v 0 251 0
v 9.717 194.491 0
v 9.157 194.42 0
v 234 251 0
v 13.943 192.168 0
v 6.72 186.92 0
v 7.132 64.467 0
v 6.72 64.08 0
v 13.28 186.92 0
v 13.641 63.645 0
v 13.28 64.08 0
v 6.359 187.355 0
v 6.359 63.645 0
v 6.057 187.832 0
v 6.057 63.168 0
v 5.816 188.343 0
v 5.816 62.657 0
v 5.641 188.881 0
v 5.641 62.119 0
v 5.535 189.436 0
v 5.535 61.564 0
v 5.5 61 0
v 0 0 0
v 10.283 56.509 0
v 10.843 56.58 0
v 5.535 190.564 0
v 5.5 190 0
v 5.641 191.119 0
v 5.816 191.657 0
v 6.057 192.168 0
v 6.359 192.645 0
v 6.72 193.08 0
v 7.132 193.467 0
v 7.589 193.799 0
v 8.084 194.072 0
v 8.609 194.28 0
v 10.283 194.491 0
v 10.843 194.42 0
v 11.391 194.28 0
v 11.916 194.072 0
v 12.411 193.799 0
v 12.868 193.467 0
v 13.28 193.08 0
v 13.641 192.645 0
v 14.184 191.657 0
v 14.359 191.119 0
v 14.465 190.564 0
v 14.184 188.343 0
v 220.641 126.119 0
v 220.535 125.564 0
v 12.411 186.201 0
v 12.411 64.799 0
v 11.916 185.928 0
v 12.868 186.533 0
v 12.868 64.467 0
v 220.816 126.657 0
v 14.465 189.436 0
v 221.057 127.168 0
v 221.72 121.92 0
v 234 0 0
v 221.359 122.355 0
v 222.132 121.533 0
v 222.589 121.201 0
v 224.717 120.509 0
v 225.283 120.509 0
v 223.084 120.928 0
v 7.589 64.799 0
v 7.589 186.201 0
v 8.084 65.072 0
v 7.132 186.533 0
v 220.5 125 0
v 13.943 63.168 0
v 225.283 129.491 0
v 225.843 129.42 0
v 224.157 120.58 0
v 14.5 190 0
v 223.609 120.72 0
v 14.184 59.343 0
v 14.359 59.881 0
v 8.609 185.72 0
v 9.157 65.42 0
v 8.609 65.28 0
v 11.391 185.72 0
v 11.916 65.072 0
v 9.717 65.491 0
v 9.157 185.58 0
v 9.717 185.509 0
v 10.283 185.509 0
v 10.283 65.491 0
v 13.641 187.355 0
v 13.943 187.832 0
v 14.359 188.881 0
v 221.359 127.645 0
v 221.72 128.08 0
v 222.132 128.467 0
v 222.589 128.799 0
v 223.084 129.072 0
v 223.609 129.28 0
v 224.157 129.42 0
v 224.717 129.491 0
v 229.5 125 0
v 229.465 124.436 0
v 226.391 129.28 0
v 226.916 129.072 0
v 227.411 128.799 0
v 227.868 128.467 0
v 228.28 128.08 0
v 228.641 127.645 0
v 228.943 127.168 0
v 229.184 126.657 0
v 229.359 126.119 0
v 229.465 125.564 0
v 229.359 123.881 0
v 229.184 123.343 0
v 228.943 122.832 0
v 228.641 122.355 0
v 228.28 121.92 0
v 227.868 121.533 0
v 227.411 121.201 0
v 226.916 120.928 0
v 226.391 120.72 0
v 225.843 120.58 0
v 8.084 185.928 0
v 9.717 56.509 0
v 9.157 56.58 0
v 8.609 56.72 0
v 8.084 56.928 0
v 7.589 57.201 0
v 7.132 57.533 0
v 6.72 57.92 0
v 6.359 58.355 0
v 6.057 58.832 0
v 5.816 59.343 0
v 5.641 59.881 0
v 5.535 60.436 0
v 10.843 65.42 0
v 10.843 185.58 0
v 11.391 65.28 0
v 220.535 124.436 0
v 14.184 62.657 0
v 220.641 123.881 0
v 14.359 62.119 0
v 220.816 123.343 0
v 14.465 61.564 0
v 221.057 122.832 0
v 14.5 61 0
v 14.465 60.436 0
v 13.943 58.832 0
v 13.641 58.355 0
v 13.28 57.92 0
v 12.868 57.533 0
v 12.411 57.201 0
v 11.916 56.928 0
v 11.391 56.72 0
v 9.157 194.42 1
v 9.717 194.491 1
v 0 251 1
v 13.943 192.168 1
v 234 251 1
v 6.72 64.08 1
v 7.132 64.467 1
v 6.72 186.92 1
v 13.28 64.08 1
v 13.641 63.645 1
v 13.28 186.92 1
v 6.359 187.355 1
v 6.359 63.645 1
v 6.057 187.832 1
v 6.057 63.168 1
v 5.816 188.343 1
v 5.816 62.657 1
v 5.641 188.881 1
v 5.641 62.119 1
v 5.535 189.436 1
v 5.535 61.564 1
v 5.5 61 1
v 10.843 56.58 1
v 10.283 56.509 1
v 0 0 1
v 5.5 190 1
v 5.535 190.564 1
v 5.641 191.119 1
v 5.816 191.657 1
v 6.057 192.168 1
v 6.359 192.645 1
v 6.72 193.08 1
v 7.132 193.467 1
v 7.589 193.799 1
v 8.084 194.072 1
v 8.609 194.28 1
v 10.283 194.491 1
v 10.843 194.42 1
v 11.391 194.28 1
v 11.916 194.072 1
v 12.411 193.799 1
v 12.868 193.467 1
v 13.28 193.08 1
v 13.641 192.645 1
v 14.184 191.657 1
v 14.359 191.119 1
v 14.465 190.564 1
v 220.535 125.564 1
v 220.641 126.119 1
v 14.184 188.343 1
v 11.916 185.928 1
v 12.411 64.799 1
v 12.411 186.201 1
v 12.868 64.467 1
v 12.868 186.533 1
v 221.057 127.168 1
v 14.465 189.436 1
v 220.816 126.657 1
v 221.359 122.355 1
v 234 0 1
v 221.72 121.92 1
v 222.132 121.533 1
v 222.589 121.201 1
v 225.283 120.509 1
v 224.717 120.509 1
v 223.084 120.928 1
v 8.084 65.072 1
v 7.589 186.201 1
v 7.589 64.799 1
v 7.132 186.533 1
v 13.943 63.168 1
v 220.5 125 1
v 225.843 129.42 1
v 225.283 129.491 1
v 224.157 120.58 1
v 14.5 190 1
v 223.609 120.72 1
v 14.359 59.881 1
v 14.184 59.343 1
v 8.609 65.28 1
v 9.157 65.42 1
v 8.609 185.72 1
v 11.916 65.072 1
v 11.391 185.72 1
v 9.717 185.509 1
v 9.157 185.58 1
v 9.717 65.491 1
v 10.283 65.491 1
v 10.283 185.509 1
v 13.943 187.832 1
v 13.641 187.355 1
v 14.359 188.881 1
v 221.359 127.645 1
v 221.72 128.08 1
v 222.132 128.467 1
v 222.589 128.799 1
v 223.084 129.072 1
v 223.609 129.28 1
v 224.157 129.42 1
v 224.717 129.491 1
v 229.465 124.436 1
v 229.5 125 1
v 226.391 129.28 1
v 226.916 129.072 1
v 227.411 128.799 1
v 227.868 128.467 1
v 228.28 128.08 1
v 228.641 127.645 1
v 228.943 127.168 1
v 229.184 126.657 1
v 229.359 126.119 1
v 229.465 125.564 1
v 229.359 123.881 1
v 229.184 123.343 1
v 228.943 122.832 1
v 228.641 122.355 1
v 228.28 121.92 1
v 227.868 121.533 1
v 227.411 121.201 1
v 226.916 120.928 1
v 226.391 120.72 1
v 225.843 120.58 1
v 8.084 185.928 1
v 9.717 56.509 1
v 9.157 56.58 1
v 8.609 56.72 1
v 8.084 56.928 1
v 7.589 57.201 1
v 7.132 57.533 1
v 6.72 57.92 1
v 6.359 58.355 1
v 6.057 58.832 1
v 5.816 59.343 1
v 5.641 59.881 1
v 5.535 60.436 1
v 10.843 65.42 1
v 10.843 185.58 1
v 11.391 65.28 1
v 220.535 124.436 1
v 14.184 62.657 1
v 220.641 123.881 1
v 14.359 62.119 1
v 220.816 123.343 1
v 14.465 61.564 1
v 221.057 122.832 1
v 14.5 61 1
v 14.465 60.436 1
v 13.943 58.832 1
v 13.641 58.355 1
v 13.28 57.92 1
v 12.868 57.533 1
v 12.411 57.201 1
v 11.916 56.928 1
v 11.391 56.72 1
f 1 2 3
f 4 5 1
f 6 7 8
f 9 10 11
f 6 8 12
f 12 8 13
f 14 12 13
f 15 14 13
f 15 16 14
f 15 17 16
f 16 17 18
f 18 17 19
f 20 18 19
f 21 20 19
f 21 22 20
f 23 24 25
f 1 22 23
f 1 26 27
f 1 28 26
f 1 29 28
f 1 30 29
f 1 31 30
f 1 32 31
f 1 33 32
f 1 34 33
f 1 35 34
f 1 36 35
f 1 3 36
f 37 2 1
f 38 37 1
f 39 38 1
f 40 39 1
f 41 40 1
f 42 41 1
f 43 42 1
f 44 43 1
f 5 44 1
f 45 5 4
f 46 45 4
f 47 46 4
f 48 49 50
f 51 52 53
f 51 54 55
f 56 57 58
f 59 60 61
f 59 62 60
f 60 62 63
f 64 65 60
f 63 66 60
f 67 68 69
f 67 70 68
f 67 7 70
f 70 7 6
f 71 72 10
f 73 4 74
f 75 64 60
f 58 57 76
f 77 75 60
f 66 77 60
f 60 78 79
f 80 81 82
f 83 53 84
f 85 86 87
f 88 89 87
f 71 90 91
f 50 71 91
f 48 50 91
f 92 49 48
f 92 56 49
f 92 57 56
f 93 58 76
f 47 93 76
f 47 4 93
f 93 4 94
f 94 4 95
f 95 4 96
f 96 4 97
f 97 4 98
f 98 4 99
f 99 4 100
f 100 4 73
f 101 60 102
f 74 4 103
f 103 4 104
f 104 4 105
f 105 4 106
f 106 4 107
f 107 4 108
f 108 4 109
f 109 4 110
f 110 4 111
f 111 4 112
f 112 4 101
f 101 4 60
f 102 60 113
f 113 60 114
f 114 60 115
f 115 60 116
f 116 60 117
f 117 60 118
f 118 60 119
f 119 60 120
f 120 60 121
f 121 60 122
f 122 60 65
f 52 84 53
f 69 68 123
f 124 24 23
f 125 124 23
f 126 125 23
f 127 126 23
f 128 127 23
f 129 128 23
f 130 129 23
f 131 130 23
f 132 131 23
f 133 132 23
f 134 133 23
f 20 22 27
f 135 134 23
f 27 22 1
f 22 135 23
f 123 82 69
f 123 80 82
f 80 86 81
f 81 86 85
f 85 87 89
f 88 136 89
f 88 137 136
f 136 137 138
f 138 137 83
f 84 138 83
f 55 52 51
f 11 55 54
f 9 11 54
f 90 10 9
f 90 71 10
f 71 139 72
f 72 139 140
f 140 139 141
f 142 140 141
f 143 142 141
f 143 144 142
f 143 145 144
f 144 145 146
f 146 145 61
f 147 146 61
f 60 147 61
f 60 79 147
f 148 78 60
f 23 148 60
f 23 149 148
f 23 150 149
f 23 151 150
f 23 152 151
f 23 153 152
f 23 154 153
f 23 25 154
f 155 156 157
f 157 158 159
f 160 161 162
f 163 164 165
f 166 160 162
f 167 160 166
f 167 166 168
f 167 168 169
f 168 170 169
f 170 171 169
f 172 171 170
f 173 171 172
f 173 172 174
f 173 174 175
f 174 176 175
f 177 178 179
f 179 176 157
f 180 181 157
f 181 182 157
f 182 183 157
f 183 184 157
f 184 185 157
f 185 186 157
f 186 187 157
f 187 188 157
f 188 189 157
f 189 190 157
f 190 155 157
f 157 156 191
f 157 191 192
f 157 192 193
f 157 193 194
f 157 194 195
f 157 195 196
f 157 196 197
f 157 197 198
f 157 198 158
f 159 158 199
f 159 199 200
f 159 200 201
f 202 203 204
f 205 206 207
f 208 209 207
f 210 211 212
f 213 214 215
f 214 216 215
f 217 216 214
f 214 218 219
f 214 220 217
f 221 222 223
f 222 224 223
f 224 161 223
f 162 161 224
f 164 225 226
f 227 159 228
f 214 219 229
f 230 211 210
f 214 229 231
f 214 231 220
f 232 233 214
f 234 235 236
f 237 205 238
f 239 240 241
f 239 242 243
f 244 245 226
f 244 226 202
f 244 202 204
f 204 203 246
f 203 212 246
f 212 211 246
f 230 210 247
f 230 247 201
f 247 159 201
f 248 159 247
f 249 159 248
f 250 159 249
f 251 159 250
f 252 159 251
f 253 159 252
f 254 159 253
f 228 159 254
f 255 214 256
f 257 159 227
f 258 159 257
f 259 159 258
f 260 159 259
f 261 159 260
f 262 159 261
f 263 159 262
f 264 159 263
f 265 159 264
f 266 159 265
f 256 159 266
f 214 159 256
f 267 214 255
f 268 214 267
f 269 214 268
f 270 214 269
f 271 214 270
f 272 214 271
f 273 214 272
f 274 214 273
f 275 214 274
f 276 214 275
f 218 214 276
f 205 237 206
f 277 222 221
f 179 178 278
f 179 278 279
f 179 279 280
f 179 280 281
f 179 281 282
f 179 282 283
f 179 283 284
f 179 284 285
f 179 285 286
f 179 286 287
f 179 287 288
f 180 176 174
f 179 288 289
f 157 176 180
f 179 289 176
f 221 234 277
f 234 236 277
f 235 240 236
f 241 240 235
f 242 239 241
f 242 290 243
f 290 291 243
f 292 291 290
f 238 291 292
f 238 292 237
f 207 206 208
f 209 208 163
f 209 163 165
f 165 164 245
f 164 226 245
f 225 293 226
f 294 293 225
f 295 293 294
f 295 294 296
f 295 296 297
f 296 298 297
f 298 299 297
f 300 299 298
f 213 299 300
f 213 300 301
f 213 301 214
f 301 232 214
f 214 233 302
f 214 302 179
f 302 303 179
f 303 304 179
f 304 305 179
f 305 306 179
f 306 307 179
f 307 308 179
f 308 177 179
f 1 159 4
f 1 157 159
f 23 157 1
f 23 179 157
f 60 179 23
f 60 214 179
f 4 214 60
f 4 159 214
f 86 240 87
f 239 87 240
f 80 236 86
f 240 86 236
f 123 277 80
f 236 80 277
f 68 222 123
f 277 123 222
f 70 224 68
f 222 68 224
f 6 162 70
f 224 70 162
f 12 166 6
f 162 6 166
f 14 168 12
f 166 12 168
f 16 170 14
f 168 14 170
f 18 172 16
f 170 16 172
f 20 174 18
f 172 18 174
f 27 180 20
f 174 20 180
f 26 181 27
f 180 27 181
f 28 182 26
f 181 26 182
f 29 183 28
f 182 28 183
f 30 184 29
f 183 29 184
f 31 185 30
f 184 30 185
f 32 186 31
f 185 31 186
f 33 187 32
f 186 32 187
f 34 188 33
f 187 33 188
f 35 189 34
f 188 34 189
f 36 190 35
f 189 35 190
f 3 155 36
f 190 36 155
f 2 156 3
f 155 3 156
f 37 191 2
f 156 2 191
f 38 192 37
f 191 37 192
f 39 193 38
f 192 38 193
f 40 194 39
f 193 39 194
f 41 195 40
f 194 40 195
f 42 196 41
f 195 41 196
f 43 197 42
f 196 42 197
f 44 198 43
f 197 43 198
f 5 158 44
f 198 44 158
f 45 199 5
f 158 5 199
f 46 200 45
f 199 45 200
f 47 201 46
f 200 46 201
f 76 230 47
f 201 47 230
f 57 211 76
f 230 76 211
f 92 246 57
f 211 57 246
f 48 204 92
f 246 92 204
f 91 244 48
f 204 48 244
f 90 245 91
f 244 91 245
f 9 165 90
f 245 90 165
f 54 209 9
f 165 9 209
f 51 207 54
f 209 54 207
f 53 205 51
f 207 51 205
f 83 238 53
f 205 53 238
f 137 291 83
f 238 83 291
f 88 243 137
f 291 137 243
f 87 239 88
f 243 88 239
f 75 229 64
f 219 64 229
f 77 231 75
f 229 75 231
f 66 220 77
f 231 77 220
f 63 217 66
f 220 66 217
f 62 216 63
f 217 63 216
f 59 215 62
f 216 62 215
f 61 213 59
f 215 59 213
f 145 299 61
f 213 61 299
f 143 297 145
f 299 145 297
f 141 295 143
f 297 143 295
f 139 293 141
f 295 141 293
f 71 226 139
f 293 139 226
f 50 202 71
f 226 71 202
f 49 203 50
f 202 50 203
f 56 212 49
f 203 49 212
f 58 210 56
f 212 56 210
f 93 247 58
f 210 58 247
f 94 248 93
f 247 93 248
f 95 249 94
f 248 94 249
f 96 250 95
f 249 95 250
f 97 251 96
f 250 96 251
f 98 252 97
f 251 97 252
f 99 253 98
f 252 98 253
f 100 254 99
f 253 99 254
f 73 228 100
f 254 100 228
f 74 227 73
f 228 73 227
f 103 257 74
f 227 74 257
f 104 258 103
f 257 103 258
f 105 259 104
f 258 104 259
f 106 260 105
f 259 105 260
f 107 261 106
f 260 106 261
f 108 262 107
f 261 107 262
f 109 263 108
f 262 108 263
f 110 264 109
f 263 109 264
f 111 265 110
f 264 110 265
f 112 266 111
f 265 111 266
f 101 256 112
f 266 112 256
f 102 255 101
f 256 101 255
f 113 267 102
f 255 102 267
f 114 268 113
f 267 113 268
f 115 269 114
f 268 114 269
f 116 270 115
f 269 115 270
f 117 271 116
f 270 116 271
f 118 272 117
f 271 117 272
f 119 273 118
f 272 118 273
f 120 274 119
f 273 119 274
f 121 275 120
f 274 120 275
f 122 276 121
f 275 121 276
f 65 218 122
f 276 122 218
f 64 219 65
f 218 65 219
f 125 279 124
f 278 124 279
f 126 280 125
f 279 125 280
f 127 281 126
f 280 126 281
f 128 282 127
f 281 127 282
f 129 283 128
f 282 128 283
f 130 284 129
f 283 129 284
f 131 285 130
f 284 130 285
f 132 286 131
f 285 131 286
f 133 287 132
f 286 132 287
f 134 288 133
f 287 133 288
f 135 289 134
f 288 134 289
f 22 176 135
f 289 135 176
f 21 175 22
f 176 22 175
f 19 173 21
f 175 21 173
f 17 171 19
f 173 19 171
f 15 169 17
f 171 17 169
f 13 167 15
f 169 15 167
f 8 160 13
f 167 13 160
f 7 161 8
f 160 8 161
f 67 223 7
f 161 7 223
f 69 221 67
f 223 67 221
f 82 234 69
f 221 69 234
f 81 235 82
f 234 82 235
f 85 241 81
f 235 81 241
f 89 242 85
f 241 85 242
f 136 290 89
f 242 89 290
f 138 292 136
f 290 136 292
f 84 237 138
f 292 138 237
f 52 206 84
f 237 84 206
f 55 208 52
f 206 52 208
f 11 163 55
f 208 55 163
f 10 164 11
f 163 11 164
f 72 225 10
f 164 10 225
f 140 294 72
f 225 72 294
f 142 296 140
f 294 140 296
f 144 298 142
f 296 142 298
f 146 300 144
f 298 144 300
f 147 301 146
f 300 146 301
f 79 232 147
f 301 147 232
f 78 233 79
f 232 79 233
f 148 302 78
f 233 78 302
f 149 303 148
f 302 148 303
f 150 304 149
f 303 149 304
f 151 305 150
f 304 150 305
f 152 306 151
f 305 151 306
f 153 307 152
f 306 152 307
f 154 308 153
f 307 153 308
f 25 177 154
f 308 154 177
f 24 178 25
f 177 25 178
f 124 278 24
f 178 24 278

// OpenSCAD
$fn=50;

max_x = 234;
max_y = 251;
origin_x = -1;
origin_y = 5;
hole_d = 9;

linear_extrude(1) {
 difference() {
  square([max_x,max_y]);
  union() {
   translate([max_x-9,125,0]) circle(d=hole_d);
   translate([10,max_y-61,0]) circle(d=hole_d);
   translate([10,61,0]) circle(d=hole_d);
  }
 }
}
color("red") translate([origin_x, origin_y, 1]) circle(d=1);
